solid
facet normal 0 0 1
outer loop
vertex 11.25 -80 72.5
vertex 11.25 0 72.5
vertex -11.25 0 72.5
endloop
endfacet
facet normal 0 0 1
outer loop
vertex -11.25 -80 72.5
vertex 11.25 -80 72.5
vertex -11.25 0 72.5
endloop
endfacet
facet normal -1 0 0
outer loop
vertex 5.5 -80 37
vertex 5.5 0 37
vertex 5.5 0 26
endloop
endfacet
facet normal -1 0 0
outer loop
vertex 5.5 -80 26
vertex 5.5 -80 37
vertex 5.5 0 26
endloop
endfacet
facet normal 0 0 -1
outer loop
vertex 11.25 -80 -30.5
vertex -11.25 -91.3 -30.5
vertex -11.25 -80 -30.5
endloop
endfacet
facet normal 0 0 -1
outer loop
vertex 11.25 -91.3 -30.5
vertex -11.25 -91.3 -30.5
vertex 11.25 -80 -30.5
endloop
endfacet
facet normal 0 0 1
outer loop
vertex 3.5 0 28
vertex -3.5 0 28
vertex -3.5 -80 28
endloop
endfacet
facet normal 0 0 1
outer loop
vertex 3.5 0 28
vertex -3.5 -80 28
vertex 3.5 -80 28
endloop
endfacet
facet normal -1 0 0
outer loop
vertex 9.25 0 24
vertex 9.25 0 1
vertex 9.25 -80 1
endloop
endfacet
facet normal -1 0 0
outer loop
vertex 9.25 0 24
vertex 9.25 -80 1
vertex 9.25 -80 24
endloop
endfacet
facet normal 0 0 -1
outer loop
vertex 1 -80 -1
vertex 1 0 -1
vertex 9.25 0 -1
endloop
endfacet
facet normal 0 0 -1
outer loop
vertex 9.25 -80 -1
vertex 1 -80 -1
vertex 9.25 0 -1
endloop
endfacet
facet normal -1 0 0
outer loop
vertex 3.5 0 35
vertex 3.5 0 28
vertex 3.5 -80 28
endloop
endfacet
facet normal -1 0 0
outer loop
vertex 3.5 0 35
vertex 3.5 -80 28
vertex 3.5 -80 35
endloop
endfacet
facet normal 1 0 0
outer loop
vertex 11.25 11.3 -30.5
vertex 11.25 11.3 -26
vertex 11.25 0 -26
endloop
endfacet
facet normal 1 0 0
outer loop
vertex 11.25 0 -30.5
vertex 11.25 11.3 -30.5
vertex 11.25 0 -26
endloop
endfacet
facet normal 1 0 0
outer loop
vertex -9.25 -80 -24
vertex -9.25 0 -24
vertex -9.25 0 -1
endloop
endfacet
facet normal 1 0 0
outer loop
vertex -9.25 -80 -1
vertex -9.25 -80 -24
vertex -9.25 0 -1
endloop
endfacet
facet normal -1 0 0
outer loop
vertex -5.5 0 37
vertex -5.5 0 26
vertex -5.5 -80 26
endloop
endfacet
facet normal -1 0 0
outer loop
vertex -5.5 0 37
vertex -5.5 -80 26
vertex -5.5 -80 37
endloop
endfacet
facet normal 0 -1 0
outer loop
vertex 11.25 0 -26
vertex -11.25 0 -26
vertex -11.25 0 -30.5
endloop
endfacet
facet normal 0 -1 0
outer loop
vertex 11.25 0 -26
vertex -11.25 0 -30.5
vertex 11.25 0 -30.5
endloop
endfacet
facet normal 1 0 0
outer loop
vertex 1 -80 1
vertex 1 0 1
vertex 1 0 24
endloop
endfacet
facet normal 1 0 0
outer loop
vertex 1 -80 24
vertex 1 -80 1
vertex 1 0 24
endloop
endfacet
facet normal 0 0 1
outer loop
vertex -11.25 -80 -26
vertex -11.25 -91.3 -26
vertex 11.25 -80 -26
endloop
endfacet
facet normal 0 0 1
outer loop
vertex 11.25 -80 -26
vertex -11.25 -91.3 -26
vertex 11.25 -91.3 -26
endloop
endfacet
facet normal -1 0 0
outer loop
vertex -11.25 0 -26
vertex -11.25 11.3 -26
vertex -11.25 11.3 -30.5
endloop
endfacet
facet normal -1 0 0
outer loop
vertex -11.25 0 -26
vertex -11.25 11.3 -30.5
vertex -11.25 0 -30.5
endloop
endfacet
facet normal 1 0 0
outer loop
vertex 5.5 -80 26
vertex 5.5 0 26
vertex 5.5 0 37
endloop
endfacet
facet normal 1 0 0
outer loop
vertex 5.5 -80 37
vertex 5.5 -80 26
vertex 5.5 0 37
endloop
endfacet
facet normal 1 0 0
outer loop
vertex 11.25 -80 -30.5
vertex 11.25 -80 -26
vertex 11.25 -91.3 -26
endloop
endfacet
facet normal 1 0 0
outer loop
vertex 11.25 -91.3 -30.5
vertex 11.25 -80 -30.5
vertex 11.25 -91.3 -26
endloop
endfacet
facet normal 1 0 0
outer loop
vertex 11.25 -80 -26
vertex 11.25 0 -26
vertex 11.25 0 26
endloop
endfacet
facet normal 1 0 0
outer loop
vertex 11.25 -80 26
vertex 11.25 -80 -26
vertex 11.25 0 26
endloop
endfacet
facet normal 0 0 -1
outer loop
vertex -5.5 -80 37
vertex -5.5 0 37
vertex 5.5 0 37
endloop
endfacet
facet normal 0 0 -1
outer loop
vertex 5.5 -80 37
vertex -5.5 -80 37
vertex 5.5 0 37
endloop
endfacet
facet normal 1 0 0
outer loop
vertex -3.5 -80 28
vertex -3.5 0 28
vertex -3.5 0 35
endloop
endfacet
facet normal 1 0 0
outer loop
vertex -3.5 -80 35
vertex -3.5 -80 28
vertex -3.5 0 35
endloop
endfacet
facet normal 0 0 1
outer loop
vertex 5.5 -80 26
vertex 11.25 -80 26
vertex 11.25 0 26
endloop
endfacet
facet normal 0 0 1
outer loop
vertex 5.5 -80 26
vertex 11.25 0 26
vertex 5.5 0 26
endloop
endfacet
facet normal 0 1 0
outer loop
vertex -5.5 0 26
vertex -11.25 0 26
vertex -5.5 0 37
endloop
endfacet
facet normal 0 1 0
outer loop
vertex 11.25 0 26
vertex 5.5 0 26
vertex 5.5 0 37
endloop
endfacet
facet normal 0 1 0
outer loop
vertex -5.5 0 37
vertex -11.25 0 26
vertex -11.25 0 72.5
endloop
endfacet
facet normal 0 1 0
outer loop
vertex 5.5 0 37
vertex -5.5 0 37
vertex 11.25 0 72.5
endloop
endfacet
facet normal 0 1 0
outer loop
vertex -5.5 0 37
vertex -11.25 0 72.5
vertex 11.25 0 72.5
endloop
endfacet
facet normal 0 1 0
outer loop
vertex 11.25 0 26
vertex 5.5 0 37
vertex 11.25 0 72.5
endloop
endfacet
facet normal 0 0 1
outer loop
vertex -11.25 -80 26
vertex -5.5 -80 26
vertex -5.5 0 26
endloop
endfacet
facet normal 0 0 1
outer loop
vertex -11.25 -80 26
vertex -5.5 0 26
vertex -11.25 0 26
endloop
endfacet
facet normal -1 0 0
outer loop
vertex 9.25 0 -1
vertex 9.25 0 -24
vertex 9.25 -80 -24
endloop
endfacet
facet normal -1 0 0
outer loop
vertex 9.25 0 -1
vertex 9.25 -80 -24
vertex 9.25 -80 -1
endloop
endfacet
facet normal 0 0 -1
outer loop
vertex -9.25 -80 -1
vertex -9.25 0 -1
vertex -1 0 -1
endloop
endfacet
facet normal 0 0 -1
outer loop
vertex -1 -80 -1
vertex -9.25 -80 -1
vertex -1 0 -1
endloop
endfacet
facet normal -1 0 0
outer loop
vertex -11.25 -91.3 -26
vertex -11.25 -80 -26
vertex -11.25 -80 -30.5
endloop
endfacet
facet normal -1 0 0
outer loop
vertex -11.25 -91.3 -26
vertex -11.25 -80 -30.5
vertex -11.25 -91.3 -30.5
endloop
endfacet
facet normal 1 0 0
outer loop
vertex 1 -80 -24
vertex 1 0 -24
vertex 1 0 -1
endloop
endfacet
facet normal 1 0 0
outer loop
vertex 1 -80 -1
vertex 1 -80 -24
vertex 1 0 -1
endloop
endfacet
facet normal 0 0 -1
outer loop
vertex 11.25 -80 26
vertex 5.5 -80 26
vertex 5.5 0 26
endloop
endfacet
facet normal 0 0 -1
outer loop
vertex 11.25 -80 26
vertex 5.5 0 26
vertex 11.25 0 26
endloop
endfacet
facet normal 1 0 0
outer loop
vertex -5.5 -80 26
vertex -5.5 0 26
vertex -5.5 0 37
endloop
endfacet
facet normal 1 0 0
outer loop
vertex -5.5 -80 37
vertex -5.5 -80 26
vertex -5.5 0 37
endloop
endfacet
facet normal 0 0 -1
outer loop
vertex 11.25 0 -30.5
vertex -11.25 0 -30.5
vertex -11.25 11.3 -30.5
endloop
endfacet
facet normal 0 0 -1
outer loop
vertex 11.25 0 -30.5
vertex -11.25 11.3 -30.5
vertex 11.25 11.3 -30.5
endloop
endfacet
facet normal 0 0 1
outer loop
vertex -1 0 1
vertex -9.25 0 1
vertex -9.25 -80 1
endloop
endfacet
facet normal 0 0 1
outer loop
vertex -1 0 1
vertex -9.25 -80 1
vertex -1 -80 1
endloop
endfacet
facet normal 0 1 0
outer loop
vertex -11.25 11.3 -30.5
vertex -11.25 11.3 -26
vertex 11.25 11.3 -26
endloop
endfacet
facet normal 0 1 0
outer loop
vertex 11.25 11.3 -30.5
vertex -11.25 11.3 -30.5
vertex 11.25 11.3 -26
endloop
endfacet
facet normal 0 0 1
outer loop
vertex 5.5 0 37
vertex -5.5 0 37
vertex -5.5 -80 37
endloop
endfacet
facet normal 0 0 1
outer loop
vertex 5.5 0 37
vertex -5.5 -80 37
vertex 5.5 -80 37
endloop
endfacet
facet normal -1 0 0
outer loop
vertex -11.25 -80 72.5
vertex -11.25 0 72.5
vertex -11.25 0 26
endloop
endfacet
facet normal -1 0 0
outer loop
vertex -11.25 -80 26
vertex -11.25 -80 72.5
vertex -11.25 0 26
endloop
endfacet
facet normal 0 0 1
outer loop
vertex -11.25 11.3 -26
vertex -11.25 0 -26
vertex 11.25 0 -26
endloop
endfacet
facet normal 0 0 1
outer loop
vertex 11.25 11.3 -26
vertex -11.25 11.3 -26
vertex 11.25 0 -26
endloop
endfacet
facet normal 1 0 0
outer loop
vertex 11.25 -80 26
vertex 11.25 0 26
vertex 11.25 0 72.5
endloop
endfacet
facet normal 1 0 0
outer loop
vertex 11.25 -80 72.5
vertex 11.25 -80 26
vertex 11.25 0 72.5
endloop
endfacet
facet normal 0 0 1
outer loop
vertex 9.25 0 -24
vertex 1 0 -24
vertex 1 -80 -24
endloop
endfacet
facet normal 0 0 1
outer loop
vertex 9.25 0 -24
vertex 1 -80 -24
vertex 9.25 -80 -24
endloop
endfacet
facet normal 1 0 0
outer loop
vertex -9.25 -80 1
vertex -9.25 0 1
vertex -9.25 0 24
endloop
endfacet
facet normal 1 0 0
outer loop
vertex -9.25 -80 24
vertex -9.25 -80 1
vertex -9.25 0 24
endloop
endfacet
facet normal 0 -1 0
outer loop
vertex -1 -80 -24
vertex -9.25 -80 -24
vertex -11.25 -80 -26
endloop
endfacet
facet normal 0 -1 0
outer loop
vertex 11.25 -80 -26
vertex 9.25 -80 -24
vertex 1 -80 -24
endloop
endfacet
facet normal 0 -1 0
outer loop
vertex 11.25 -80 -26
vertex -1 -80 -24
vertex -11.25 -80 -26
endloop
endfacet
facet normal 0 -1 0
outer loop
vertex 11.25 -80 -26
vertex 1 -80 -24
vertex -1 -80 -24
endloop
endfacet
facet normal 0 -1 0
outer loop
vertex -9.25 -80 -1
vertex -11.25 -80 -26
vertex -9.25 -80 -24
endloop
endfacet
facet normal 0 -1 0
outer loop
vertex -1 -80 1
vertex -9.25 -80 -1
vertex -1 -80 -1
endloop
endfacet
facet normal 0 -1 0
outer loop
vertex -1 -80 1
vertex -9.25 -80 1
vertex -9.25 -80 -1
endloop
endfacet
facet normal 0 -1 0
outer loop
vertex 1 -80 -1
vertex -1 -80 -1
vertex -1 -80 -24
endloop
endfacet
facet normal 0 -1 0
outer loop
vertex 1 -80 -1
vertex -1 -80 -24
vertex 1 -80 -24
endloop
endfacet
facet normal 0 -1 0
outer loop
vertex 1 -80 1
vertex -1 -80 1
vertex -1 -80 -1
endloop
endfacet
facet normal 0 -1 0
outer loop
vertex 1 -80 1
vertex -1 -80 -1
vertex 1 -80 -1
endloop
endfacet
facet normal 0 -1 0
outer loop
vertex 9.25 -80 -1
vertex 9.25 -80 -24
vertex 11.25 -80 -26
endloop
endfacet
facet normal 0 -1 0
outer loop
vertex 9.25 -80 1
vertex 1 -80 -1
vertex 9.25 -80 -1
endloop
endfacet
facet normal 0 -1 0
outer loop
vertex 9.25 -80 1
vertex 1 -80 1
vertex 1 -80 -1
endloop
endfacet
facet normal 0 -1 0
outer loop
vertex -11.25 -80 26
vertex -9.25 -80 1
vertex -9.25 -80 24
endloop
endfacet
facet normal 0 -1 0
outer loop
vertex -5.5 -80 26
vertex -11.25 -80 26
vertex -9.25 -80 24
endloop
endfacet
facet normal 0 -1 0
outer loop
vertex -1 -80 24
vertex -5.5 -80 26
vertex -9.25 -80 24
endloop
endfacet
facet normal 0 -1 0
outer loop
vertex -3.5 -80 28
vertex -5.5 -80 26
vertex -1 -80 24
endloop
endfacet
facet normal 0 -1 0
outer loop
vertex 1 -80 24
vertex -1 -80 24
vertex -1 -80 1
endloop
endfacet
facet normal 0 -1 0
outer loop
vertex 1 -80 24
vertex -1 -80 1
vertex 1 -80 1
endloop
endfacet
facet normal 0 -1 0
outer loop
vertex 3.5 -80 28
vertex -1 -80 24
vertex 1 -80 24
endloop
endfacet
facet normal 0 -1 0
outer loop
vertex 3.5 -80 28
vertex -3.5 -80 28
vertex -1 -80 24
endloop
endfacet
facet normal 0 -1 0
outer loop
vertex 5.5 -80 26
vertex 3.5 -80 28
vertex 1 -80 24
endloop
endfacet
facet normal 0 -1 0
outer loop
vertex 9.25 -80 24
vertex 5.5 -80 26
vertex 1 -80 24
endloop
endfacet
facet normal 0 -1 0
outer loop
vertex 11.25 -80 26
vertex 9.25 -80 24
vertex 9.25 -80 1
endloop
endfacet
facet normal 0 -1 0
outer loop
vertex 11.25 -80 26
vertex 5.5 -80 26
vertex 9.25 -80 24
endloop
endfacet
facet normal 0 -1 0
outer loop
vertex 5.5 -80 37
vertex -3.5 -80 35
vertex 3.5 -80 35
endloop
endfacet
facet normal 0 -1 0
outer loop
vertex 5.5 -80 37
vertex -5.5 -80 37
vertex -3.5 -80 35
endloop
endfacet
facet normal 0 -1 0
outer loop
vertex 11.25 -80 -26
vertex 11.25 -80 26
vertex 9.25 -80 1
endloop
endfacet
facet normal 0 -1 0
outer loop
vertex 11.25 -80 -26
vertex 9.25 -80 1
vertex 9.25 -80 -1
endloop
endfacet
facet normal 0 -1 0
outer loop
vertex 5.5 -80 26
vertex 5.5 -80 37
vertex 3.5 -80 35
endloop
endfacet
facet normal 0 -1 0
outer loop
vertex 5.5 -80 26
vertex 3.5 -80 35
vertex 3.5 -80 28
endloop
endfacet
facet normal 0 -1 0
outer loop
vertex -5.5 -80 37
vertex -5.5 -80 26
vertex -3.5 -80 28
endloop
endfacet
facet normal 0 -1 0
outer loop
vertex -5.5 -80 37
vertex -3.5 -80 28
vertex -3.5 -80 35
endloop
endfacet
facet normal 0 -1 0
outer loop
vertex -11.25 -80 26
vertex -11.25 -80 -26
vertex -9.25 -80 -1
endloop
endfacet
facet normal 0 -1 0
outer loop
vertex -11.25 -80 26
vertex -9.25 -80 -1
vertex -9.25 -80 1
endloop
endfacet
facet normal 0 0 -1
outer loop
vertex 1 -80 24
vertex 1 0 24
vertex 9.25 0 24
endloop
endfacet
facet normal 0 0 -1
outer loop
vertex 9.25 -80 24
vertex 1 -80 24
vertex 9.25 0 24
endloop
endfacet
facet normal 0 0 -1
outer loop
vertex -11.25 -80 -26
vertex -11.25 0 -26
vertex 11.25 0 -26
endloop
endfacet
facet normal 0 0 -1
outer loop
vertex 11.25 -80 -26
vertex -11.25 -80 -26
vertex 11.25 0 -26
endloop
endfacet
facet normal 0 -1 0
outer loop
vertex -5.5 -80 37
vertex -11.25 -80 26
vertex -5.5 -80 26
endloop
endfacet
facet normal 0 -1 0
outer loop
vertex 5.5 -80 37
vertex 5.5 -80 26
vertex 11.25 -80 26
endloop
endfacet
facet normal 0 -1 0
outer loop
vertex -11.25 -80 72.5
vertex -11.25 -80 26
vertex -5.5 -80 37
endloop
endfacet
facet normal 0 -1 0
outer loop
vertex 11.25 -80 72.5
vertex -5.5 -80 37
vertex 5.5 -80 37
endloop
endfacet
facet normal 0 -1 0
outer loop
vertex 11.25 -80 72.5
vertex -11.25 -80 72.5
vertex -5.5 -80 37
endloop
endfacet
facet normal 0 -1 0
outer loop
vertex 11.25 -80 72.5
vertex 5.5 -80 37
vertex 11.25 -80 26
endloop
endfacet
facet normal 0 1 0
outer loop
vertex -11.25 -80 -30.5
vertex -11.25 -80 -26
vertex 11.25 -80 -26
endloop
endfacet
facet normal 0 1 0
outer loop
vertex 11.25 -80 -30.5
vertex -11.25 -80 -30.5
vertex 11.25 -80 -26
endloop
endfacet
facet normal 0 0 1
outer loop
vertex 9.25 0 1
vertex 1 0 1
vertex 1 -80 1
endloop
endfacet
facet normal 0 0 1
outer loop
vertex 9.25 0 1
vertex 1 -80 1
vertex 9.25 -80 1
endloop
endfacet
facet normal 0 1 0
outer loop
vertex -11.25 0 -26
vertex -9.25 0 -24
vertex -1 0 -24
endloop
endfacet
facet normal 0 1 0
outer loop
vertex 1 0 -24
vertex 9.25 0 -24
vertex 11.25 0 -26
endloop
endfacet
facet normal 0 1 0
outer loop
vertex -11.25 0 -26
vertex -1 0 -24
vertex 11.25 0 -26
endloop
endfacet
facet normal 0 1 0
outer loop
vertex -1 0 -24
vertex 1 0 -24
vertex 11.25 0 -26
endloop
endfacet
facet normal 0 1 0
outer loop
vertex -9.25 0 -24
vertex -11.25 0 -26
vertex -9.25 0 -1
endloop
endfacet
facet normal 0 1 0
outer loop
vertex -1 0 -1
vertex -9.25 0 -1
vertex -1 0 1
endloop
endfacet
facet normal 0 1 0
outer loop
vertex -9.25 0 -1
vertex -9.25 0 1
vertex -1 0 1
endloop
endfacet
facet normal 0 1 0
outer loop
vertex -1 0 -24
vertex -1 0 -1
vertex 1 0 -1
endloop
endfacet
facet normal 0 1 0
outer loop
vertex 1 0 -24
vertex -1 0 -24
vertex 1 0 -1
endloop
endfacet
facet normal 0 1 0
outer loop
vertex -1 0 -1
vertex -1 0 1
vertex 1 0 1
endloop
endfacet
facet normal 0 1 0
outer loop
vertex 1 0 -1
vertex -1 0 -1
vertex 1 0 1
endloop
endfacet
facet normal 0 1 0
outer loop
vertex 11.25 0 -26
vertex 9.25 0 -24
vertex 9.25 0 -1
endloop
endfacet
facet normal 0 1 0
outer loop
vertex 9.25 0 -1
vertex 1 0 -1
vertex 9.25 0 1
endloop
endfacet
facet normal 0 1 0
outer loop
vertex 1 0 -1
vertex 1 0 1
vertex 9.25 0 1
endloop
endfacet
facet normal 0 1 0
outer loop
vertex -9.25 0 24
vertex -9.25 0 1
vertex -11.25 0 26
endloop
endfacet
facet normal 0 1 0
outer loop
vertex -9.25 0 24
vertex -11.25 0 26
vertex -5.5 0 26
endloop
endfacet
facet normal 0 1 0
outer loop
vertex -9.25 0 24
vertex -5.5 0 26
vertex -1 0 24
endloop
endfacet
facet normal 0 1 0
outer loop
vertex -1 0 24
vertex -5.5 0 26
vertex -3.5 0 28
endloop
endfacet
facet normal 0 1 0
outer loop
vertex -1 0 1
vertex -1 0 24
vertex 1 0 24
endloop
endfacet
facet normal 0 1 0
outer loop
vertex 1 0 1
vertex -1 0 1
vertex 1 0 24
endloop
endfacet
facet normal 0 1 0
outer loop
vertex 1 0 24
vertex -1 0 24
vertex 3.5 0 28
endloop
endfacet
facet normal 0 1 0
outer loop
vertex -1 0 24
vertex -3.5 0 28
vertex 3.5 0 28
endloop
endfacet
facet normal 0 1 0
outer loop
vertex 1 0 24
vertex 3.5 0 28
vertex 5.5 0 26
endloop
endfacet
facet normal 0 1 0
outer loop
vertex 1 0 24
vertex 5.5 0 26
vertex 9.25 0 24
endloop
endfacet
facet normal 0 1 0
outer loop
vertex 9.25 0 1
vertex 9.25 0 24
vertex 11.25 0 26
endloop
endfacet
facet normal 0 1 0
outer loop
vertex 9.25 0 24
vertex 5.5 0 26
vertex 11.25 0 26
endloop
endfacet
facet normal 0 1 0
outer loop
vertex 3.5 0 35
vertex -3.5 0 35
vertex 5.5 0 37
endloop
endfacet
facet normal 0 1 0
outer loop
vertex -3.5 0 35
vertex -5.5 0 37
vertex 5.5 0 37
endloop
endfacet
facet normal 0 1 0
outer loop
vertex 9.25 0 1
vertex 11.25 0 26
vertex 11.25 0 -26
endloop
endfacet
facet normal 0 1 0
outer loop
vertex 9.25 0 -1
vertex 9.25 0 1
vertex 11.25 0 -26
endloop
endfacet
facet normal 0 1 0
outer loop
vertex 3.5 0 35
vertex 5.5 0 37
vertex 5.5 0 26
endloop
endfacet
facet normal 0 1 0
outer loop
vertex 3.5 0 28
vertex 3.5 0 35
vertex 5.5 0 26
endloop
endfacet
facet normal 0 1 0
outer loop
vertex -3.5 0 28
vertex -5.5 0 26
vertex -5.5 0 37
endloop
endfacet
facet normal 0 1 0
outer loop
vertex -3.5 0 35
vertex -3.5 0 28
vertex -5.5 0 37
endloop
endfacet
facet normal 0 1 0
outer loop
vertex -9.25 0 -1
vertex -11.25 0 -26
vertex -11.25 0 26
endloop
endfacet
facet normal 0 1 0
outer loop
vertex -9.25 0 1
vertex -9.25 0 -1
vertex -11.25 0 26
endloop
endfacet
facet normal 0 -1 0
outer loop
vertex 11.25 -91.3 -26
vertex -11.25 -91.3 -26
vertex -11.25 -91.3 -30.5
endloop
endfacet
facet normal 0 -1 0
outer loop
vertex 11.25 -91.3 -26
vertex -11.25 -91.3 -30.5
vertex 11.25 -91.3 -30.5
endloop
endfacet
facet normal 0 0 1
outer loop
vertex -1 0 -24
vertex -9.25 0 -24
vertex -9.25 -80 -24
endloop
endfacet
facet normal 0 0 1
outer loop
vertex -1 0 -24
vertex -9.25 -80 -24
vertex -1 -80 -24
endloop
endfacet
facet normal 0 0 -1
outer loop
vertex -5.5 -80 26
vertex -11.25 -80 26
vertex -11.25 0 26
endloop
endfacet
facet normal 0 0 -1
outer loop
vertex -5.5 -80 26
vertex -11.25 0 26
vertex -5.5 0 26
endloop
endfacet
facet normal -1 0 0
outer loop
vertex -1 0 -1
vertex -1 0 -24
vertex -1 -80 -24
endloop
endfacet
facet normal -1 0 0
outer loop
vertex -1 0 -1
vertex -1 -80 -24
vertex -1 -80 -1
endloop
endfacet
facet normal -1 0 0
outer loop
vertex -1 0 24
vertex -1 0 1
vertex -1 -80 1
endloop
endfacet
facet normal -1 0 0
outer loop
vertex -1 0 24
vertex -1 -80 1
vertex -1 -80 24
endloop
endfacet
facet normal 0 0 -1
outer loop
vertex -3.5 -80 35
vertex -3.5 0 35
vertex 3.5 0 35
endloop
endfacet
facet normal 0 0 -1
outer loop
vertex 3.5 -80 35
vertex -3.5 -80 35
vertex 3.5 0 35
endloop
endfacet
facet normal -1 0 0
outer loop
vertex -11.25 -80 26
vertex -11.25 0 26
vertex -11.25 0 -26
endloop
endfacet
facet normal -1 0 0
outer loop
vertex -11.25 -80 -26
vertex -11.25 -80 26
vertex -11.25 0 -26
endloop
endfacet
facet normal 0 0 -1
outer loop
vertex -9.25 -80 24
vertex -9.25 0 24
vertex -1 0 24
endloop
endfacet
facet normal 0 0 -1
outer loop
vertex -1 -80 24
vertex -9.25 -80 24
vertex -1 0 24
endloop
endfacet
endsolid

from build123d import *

# Parameters (mm, degrees)
F0_W     = 8.25
F0_H     = 23
F0_W_2   = 11
F0_H_2   = 11
F0_W_3   = 7
F0_H_3   = 7
F1_DEPTH = 80
F3_DEPTH = 80
F4_W     = 22.5
F4_H     = 11.3
F5_DEPTH = 4.5


with BuildPart() as f1:
    # F0 (on Front) → F1 (new body)
    with BuildSketch(Plane.XZ):
        Polygon((11.25, -26), (11.25, 26), (5.5, 26), (-5.5, 26), (-11.25, 26), (-11.25, -26), align=None)
        with Locations((-5.125, -12.5)):
            Rectangle(F0_W, F0_H, mode=Mode.SUBTRACT)
        with Locations((5.125, -12.5)):
            Rectangle(F0_W, F0_H, mode=Mode.SUBTRACT)
        with Locations((-5.125, 12.5)):
            Rectangle(F0_W, F0_H, mode=Mode.SUBTRACT)
        with Locations((5.125, 12.5)):
            Rectangle(F0_W, F0_H, mode=Mode.SUBTRACT)
        with Locations((0, 31.5)):
            Rectangle(F0_W_2, F0_H_2)
        with Locations((0, 31.5)):
            Rectangle(F0_W_3, F0_H_3, mode=Mode.SUBTRACT)
    extrude(amount=F1_DEPTH)


with BuildPart() as f3:
    # F2 (on Front) → F3 (new body)
    with BuildSketch(Plane.XZ):
        Polygon((-11.25, 26), (-5.5, 26), (-5.5, 37), (5.5, 37), (5.5, 26), (11.25, 26), (11.25, 72.5), (-11.25, 72.5), align=None)
    extrude(amount=F3_DEPTH)


with BuildPart() as f5:
    # F4 (on face) → F5 (new body)
    with BuildSketch(Plane(origin=(0, 0, -26), x_dir=(1, 0, 0), z_dir=(0, 0, -1))):
        with Locations((0, -5.65)):
            Rectangle(F4_W, F4_H)
        with Locations((0, 85.65)):
            Rectangle(F4_W, F4_H)
    extrude(amount=F5_DEPTH)


solid = Compound([f1.part, f3.part, f5.part])
